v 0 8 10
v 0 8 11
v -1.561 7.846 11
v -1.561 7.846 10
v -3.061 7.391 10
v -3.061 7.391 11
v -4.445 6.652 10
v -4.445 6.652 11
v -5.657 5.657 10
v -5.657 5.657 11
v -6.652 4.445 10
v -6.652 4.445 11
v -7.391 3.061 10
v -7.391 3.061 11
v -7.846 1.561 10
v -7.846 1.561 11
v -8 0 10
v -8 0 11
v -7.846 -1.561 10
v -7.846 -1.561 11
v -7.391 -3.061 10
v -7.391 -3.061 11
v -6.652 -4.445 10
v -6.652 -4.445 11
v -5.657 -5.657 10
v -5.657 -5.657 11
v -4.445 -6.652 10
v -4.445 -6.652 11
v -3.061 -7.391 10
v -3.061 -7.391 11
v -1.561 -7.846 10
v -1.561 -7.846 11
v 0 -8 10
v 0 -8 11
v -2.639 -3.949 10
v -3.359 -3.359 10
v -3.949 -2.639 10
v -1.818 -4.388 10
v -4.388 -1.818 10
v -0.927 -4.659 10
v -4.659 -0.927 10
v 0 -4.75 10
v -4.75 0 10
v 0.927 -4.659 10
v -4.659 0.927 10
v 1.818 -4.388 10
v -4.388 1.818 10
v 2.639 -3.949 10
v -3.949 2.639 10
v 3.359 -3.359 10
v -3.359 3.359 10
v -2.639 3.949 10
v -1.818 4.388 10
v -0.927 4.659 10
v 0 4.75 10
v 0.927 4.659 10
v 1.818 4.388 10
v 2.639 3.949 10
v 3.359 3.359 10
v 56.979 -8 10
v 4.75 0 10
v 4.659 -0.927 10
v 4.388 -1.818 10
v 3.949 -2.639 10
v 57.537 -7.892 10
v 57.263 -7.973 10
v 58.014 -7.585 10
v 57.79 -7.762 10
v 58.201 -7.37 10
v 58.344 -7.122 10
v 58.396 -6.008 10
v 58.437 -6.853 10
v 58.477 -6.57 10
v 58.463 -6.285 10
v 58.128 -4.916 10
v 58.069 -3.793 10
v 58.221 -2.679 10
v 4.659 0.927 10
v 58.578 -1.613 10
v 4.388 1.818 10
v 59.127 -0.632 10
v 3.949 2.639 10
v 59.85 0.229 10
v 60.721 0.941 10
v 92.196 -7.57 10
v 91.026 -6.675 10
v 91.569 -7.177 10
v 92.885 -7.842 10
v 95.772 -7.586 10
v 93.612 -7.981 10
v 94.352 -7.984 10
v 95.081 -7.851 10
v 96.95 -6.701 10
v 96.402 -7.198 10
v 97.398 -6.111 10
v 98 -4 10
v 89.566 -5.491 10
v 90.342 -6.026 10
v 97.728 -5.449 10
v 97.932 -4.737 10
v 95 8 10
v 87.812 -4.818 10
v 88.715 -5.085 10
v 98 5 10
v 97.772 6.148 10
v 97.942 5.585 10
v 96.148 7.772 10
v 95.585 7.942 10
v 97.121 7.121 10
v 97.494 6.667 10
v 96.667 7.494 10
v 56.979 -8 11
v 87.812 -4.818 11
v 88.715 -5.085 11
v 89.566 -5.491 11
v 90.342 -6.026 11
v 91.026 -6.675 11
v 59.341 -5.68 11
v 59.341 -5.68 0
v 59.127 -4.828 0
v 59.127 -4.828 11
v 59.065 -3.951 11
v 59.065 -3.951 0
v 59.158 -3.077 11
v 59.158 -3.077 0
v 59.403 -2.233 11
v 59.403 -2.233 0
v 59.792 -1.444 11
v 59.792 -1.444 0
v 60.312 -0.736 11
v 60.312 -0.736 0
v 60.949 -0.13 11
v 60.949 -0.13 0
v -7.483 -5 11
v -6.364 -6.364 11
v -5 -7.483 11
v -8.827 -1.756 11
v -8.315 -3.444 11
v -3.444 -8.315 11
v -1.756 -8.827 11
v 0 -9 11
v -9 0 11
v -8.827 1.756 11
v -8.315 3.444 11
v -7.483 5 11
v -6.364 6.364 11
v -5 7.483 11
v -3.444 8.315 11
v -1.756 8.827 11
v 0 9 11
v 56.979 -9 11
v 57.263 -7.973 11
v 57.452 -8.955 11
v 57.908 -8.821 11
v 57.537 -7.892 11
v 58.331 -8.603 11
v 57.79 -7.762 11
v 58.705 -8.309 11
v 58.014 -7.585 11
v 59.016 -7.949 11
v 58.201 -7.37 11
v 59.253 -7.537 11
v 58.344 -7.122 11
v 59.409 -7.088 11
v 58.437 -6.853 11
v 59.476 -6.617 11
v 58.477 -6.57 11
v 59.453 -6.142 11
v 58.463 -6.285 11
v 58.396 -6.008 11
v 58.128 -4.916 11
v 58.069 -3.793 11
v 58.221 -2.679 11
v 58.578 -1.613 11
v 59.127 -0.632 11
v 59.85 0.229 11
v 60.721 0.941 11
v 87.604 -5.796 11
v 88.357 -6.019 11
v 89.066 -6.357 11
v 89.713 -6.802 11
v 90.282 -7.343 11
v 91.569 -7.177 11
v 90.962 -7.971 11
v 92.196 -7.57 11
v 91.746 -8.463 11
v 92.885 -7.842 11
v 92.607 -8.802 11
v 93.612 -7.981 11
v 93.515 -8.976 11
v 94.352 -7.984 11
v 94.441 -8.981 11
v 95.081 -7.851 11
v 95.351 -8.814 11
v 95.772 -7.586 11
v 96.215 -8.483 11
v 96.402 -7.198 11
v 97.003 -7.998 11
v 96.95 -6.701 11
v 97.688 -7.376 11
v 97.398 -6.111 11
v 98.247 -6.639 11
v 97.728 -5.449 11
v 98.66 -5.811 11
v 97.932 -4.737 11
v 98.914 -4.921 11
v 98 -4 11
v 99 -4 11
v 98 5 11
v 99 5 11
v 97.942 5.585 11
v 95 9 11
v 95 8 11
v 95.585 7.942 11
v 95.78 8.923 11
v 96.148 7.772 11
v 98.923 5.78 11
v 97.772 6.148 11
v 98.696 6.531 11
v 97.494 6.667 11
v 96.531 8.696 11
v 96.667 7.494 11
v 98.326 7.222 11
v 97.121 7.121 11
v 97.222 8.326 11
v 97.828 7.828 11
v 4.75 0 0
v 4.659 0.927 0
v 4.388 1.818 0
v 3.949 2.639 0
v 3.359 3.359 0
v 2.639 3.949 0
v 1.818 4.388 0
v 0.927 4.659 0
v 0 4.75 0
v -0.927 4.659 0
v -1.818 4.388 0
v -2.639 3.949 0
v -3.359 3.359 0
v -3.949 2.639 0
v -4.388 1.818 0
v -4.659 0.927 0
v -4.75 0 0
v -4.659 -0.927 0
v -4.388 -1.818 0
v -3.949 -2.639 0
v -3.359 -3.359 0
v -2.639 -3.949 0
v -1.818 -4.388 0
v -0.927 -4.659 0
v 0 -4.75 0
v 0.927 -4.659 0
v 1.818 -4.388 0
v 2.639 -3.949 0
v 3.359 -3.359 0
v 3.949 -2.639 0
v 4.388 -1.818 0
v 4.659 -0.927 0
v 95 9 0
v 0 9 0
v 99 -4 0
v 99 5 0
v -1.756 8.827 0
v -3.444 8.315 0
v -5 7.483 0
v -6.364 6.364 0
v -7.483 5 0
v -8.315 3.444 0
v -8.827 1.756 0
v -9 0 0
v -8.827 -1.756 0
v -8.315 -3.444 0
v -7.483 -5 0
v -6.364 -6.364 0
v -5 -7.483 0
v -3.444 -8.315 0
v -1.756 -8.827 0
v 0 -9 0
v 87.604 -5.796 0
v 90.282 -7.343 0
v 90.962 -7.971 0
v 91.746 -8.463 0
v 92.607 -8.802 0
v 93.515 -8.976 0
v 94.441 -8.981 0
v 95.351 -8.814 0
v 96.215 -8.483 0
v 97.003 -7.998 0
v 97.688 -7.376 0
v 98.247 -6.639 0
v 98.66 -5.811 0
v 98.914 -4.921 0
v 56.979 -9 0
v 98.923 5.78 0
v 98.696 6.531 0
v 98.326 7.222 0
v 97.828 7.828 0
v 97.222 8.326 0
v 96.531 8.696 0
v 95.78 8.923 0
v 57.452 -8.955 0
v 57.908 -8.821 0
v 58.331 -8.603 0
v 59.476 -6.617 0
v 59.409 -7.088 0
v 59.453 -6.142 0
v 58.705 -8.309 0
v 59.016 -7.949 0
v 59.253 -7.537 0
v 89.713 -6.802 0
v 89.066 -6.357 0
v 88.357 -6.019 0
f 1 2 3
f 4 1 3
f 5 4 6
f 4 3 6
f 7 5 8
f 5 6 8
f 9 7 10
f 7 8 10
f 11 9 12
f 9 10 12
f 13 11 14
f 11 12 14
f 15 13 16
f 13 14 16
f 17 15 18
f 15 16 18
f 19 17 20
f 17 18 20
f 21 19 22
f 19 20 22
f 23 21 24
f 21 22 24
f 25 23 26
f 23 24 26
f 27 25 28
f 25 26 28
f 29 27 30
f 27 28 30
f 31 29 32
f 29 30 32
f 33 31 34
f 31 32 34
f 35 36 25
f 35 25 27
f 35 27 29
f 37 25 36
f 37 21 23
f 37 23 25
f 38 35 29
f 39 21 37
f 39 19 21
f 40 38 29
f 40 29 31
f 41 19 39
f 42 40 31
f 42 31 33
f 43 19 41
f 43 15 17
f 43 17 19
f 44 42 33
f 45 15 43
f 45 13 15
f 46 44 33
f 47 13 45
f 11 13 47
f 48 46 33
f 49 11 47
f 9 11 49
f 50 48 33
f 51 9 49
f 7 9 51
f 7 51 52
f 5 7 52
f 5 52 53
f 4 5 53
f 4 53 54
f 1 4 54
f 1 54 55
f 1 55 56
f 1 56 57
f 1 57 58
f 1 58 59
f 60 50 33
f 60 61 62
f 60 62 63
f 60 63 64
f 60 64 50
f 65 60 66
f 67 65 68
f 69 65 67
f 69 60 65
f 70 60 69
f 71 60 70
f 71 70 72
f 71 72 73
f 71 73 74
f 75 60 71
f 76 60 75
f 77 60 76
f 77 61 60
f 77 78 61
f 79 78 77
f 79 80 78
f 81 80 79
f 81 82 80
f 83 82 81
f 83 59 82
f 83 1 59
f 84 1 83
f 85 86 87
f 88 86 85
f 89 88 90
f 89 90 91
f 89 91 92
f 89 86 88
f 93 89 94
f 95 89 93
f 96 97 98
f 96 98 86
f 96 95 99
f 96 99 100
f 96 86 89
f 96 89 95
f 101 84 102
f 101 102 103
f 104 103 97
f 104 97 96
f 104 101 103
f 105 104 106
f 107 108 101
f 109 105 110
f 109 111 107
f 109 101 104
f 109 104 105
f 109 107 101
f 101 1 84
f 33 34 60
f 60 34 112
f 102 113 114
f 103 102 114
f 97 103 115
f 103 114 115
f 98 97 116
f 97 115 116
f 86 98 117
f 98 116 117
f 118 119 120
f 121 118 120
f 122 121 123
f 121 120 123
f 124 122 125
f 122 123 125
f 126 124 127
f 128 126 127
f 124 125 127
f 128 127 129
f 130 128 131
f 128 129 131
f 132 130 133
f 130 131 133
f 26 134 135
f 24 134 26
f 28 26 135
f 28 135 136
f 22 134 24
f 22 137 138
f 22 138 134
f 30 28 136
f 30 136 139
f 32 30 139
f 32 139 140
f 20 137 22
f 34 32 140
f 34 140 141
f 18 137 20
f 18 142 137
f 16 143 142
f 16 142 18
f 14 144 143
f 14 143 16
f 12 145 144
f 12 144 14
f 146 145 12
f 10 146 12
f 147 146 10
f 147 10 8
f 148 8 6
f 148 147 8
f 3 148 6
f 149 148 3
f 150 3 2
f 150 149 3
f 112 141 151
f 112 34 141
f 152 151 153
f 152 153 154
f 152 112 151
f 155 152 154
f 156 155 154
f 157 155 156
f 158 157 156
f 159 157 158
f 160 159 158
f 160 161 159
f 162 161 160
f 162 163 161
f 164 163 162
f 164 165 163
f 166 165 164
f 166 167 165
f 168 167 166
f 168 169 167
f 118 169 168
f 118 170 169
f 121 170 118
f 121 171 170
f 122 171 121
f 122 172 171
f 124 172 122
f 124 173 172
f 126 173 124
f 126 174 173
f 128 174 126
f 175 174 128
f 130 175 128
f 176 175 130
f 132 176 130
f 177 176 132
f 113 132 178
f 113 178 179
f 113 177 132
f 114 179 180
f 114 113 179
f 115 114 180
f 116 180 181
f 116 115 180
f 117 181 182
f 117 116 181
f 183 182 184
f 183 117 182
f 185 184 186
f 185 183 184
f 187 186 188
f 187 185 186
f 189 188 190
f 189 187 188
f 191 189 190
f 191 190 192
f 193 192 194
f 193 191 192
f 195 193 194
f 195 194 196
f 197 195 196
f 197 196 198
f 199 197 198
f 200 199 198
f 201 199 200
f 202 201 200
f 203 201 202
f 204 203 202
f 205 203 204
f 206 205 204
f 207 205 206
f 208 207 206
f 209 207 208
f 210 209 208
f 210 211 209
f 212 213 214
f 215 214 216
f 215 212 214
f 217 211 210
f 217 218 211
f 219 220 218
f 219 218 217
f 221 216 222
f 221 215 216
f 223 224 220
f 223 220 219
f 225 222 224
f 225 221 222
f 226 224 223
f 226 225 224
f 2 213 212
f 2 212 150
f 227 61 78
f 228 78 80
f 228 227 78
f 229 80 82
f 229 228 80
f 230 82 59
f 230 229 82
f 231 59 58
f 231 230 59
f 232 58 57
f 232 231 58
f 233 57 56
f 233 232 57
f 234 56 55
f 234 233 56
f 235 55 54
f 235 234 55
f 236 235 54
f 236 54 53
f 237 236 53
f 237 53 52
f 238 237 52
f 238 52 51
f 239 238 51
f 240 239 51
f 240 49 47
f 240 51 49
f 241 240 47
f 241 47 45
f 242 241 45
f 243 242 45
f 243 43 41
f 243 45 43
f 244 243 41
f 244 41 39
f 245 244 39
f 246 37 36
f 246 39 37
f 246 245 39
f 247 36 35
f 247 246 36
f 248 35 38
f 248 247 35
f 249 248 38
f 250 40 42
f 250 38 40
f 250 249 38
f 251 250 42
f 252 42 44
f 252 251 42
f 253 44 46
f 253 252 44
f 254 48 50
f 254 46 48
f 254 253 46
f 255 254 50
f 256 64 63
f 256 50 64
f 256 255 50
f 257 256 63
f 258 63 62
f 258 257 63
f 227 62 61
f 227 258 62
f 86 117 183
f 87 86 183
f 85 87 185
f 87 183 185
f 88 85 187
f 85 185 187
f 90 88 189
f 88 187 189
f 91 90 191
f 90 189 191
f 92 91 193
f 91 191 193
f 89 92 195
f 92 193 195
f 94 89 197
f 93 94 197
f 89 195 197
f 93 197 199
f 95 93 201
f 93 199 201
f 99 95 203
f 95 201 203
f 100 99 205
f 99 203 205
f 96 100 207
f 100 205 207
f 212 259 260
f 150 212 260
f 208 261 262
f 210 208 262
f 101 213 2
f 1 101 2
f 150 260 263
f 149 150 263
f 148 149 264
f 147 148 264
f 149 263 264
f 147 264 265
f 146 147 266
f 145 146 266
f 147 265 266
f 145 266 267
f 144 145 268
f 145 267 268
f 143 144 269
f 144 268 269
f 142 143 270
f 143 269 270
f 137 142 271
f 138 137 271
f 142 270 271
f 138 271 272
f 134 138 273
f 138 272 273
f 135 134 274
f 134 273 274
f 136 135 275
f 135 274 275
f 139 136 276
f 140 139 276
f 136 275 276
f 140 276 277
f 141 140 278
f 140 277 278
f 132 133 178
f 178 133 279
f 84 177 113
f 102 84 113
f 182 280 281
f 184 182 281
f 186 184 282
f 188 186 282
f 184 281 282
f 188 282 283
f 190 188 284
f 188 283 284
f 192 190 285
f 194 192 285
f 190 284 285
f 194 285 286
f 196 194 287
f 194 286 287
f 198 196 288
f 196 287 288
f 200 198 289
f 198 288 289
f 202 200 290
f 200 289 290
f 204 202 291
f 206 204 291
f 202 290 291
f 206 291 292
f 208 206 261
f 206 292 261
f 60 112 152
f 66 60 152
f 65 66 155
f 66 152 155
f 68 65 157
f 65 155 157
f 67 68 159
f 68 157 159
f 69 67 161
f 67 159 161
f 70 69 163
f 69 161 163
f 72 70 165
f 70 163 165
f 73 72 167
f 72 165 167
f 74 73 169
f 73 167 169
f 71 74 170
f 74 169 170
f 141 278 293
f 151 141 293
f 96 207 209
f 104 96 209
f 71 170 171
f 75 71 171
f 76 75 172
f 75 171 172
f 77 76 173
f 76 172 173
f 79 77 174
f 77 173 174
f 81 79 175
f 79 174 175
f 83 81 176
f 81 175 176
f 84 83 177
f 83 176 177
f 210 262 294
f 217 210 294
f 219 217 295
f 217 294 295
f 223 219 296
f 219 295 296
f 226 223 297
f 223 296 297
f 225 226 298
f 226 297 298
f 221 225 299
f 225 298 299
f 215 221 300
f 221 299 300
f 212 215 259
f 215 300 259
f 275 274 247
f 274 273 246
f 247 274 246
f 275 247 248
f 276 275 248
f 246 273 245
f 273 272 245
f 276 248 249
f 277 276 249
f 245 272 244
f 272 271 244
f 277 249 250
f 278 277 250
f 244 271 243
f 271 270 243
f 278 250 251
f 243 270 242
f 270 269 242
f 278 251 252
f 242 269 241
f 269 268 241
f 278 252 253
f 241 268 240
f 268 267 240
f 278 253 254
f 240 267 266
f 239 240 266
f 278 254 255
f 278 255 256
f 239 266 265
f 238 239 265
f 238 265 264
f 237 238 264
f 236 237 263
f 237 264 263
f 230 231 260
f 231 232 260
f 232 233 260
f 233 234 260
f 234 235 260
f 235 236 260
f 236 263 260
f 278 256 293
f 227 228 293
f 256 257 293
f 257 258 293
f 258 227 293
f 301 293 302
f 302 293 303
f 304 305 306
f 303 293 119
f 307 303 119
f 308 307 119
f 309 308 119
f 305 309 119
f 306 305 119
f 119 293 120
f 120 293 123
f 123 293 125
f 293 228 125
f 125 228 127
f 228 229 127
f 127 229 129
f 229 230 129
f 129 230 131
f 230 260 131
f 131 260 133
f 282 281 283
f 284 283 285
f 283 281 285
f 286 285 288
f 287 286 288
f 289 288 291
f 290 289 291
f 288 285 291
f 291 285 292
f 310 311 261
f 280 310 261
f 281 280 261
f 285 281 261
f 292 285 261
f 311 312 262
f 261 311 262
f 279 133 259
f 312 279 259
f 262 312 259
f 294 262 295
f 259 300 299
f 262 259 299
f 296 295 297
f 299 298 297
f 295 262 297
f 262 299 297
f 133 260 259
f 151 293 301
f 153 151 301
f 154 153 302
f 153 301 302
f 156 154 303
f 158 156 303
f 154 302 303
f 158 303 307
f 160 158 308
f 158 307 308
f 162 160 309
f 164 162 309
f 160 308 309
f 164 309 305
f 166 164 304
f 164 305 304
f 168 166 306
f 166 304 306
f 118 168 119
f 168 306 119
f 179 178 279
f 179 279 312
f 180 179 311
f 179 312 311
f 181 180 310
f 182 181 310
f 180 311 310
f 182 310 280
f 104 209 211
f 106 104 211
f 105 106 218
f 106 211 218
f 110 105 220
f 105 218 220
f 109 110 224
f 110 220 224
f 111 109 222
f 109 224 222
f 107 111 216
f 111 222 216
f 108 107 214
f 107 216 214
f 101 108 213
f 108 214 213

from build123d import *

# Parameters (mm, degrees)
SKETCH2_R           = 4.75
BOSS_EXTRUDE1_DEPTH = 11
CUT_EXTRUDE1_DEPTH  = 1


with BuildPart() as part:
    # Sketch2 → Boss-Extrude1 (new body)
    with BuildSketch(Plane.XY):
        with BuildLine():
            Line((0, -9), (56.97881801, -9))
            ThreePointArc((56.97881801, -9), (59.015853911, -7.949304916), (59.340646926, -5.680387791))
            ThreePointArc((59.340646926, -5.680387791), (59.261907809, -2.649407806), (60.949113688, -0.130206379))
            Line((60.949113688, -0.130206379), (87.603863211, -5.795848289))
            ThreePointArc((87.603863211, -5.795848289), (89.065679287, -6.35725315), (90.282152379, -7.343293147))
            ThreePointArc((90.282152379, -7.343293147), (95.79035777, -8.66847074), (99, -4))
            Line((99, -4), (99, 5))
            ThreePointArc((99, 5), (97.828427125, 7.828427125), (95, 9))
            Line((95, 9), (0, 9))
            ThreePointArc((0, 9), (-9, 0), (0, -9))
        make_face()
        Circle(SKETCH2_R, mode=Mode.SUBTRACT)
    extrude(amount=BOSS_EXTRUDE1_DEPTH)

    # Sketch4 → Cut-Extrude1 (cut)
    with BuildSketch(Plane.XY.offset(11)):
        with BuildLine():
            Line((60.720530375, 0.940721099), (87.811774902, -4.817700689))
            ThreePointArc((87.811774902, -4.817700689), (89.565954193, -5.491386522), (91.025721903, -6.674634517))
            ThreePointArc((91.025721903, -6.674634517), (95.432286216, -7.734776592), (98, -4))
            Line((98, -4), (98, 5))
            ThreePointArc((98, 5), (97.121320344, 7.121320344), (95, 8))
            Line((95, 8), (0, 8))
            ThreePointArc((0, 8), (-8, 0), (0, -8))
            Line((0, -8), (56.97881801, -8))
            ThreePointArc((56.97881801, -8), (58.201039551, -7.369582949), (58.39591536, -6.008232674))
            ThreePointArc((58.39591536, -6.008232674), (58.374246442, -2.137683304), (60.720530375, 0.940721099))
        make_face()
    extrude(amount=-CUT_EXTRUDE1_DEPTH, mode=Mode.SUBTRACT)


solid = part.part
